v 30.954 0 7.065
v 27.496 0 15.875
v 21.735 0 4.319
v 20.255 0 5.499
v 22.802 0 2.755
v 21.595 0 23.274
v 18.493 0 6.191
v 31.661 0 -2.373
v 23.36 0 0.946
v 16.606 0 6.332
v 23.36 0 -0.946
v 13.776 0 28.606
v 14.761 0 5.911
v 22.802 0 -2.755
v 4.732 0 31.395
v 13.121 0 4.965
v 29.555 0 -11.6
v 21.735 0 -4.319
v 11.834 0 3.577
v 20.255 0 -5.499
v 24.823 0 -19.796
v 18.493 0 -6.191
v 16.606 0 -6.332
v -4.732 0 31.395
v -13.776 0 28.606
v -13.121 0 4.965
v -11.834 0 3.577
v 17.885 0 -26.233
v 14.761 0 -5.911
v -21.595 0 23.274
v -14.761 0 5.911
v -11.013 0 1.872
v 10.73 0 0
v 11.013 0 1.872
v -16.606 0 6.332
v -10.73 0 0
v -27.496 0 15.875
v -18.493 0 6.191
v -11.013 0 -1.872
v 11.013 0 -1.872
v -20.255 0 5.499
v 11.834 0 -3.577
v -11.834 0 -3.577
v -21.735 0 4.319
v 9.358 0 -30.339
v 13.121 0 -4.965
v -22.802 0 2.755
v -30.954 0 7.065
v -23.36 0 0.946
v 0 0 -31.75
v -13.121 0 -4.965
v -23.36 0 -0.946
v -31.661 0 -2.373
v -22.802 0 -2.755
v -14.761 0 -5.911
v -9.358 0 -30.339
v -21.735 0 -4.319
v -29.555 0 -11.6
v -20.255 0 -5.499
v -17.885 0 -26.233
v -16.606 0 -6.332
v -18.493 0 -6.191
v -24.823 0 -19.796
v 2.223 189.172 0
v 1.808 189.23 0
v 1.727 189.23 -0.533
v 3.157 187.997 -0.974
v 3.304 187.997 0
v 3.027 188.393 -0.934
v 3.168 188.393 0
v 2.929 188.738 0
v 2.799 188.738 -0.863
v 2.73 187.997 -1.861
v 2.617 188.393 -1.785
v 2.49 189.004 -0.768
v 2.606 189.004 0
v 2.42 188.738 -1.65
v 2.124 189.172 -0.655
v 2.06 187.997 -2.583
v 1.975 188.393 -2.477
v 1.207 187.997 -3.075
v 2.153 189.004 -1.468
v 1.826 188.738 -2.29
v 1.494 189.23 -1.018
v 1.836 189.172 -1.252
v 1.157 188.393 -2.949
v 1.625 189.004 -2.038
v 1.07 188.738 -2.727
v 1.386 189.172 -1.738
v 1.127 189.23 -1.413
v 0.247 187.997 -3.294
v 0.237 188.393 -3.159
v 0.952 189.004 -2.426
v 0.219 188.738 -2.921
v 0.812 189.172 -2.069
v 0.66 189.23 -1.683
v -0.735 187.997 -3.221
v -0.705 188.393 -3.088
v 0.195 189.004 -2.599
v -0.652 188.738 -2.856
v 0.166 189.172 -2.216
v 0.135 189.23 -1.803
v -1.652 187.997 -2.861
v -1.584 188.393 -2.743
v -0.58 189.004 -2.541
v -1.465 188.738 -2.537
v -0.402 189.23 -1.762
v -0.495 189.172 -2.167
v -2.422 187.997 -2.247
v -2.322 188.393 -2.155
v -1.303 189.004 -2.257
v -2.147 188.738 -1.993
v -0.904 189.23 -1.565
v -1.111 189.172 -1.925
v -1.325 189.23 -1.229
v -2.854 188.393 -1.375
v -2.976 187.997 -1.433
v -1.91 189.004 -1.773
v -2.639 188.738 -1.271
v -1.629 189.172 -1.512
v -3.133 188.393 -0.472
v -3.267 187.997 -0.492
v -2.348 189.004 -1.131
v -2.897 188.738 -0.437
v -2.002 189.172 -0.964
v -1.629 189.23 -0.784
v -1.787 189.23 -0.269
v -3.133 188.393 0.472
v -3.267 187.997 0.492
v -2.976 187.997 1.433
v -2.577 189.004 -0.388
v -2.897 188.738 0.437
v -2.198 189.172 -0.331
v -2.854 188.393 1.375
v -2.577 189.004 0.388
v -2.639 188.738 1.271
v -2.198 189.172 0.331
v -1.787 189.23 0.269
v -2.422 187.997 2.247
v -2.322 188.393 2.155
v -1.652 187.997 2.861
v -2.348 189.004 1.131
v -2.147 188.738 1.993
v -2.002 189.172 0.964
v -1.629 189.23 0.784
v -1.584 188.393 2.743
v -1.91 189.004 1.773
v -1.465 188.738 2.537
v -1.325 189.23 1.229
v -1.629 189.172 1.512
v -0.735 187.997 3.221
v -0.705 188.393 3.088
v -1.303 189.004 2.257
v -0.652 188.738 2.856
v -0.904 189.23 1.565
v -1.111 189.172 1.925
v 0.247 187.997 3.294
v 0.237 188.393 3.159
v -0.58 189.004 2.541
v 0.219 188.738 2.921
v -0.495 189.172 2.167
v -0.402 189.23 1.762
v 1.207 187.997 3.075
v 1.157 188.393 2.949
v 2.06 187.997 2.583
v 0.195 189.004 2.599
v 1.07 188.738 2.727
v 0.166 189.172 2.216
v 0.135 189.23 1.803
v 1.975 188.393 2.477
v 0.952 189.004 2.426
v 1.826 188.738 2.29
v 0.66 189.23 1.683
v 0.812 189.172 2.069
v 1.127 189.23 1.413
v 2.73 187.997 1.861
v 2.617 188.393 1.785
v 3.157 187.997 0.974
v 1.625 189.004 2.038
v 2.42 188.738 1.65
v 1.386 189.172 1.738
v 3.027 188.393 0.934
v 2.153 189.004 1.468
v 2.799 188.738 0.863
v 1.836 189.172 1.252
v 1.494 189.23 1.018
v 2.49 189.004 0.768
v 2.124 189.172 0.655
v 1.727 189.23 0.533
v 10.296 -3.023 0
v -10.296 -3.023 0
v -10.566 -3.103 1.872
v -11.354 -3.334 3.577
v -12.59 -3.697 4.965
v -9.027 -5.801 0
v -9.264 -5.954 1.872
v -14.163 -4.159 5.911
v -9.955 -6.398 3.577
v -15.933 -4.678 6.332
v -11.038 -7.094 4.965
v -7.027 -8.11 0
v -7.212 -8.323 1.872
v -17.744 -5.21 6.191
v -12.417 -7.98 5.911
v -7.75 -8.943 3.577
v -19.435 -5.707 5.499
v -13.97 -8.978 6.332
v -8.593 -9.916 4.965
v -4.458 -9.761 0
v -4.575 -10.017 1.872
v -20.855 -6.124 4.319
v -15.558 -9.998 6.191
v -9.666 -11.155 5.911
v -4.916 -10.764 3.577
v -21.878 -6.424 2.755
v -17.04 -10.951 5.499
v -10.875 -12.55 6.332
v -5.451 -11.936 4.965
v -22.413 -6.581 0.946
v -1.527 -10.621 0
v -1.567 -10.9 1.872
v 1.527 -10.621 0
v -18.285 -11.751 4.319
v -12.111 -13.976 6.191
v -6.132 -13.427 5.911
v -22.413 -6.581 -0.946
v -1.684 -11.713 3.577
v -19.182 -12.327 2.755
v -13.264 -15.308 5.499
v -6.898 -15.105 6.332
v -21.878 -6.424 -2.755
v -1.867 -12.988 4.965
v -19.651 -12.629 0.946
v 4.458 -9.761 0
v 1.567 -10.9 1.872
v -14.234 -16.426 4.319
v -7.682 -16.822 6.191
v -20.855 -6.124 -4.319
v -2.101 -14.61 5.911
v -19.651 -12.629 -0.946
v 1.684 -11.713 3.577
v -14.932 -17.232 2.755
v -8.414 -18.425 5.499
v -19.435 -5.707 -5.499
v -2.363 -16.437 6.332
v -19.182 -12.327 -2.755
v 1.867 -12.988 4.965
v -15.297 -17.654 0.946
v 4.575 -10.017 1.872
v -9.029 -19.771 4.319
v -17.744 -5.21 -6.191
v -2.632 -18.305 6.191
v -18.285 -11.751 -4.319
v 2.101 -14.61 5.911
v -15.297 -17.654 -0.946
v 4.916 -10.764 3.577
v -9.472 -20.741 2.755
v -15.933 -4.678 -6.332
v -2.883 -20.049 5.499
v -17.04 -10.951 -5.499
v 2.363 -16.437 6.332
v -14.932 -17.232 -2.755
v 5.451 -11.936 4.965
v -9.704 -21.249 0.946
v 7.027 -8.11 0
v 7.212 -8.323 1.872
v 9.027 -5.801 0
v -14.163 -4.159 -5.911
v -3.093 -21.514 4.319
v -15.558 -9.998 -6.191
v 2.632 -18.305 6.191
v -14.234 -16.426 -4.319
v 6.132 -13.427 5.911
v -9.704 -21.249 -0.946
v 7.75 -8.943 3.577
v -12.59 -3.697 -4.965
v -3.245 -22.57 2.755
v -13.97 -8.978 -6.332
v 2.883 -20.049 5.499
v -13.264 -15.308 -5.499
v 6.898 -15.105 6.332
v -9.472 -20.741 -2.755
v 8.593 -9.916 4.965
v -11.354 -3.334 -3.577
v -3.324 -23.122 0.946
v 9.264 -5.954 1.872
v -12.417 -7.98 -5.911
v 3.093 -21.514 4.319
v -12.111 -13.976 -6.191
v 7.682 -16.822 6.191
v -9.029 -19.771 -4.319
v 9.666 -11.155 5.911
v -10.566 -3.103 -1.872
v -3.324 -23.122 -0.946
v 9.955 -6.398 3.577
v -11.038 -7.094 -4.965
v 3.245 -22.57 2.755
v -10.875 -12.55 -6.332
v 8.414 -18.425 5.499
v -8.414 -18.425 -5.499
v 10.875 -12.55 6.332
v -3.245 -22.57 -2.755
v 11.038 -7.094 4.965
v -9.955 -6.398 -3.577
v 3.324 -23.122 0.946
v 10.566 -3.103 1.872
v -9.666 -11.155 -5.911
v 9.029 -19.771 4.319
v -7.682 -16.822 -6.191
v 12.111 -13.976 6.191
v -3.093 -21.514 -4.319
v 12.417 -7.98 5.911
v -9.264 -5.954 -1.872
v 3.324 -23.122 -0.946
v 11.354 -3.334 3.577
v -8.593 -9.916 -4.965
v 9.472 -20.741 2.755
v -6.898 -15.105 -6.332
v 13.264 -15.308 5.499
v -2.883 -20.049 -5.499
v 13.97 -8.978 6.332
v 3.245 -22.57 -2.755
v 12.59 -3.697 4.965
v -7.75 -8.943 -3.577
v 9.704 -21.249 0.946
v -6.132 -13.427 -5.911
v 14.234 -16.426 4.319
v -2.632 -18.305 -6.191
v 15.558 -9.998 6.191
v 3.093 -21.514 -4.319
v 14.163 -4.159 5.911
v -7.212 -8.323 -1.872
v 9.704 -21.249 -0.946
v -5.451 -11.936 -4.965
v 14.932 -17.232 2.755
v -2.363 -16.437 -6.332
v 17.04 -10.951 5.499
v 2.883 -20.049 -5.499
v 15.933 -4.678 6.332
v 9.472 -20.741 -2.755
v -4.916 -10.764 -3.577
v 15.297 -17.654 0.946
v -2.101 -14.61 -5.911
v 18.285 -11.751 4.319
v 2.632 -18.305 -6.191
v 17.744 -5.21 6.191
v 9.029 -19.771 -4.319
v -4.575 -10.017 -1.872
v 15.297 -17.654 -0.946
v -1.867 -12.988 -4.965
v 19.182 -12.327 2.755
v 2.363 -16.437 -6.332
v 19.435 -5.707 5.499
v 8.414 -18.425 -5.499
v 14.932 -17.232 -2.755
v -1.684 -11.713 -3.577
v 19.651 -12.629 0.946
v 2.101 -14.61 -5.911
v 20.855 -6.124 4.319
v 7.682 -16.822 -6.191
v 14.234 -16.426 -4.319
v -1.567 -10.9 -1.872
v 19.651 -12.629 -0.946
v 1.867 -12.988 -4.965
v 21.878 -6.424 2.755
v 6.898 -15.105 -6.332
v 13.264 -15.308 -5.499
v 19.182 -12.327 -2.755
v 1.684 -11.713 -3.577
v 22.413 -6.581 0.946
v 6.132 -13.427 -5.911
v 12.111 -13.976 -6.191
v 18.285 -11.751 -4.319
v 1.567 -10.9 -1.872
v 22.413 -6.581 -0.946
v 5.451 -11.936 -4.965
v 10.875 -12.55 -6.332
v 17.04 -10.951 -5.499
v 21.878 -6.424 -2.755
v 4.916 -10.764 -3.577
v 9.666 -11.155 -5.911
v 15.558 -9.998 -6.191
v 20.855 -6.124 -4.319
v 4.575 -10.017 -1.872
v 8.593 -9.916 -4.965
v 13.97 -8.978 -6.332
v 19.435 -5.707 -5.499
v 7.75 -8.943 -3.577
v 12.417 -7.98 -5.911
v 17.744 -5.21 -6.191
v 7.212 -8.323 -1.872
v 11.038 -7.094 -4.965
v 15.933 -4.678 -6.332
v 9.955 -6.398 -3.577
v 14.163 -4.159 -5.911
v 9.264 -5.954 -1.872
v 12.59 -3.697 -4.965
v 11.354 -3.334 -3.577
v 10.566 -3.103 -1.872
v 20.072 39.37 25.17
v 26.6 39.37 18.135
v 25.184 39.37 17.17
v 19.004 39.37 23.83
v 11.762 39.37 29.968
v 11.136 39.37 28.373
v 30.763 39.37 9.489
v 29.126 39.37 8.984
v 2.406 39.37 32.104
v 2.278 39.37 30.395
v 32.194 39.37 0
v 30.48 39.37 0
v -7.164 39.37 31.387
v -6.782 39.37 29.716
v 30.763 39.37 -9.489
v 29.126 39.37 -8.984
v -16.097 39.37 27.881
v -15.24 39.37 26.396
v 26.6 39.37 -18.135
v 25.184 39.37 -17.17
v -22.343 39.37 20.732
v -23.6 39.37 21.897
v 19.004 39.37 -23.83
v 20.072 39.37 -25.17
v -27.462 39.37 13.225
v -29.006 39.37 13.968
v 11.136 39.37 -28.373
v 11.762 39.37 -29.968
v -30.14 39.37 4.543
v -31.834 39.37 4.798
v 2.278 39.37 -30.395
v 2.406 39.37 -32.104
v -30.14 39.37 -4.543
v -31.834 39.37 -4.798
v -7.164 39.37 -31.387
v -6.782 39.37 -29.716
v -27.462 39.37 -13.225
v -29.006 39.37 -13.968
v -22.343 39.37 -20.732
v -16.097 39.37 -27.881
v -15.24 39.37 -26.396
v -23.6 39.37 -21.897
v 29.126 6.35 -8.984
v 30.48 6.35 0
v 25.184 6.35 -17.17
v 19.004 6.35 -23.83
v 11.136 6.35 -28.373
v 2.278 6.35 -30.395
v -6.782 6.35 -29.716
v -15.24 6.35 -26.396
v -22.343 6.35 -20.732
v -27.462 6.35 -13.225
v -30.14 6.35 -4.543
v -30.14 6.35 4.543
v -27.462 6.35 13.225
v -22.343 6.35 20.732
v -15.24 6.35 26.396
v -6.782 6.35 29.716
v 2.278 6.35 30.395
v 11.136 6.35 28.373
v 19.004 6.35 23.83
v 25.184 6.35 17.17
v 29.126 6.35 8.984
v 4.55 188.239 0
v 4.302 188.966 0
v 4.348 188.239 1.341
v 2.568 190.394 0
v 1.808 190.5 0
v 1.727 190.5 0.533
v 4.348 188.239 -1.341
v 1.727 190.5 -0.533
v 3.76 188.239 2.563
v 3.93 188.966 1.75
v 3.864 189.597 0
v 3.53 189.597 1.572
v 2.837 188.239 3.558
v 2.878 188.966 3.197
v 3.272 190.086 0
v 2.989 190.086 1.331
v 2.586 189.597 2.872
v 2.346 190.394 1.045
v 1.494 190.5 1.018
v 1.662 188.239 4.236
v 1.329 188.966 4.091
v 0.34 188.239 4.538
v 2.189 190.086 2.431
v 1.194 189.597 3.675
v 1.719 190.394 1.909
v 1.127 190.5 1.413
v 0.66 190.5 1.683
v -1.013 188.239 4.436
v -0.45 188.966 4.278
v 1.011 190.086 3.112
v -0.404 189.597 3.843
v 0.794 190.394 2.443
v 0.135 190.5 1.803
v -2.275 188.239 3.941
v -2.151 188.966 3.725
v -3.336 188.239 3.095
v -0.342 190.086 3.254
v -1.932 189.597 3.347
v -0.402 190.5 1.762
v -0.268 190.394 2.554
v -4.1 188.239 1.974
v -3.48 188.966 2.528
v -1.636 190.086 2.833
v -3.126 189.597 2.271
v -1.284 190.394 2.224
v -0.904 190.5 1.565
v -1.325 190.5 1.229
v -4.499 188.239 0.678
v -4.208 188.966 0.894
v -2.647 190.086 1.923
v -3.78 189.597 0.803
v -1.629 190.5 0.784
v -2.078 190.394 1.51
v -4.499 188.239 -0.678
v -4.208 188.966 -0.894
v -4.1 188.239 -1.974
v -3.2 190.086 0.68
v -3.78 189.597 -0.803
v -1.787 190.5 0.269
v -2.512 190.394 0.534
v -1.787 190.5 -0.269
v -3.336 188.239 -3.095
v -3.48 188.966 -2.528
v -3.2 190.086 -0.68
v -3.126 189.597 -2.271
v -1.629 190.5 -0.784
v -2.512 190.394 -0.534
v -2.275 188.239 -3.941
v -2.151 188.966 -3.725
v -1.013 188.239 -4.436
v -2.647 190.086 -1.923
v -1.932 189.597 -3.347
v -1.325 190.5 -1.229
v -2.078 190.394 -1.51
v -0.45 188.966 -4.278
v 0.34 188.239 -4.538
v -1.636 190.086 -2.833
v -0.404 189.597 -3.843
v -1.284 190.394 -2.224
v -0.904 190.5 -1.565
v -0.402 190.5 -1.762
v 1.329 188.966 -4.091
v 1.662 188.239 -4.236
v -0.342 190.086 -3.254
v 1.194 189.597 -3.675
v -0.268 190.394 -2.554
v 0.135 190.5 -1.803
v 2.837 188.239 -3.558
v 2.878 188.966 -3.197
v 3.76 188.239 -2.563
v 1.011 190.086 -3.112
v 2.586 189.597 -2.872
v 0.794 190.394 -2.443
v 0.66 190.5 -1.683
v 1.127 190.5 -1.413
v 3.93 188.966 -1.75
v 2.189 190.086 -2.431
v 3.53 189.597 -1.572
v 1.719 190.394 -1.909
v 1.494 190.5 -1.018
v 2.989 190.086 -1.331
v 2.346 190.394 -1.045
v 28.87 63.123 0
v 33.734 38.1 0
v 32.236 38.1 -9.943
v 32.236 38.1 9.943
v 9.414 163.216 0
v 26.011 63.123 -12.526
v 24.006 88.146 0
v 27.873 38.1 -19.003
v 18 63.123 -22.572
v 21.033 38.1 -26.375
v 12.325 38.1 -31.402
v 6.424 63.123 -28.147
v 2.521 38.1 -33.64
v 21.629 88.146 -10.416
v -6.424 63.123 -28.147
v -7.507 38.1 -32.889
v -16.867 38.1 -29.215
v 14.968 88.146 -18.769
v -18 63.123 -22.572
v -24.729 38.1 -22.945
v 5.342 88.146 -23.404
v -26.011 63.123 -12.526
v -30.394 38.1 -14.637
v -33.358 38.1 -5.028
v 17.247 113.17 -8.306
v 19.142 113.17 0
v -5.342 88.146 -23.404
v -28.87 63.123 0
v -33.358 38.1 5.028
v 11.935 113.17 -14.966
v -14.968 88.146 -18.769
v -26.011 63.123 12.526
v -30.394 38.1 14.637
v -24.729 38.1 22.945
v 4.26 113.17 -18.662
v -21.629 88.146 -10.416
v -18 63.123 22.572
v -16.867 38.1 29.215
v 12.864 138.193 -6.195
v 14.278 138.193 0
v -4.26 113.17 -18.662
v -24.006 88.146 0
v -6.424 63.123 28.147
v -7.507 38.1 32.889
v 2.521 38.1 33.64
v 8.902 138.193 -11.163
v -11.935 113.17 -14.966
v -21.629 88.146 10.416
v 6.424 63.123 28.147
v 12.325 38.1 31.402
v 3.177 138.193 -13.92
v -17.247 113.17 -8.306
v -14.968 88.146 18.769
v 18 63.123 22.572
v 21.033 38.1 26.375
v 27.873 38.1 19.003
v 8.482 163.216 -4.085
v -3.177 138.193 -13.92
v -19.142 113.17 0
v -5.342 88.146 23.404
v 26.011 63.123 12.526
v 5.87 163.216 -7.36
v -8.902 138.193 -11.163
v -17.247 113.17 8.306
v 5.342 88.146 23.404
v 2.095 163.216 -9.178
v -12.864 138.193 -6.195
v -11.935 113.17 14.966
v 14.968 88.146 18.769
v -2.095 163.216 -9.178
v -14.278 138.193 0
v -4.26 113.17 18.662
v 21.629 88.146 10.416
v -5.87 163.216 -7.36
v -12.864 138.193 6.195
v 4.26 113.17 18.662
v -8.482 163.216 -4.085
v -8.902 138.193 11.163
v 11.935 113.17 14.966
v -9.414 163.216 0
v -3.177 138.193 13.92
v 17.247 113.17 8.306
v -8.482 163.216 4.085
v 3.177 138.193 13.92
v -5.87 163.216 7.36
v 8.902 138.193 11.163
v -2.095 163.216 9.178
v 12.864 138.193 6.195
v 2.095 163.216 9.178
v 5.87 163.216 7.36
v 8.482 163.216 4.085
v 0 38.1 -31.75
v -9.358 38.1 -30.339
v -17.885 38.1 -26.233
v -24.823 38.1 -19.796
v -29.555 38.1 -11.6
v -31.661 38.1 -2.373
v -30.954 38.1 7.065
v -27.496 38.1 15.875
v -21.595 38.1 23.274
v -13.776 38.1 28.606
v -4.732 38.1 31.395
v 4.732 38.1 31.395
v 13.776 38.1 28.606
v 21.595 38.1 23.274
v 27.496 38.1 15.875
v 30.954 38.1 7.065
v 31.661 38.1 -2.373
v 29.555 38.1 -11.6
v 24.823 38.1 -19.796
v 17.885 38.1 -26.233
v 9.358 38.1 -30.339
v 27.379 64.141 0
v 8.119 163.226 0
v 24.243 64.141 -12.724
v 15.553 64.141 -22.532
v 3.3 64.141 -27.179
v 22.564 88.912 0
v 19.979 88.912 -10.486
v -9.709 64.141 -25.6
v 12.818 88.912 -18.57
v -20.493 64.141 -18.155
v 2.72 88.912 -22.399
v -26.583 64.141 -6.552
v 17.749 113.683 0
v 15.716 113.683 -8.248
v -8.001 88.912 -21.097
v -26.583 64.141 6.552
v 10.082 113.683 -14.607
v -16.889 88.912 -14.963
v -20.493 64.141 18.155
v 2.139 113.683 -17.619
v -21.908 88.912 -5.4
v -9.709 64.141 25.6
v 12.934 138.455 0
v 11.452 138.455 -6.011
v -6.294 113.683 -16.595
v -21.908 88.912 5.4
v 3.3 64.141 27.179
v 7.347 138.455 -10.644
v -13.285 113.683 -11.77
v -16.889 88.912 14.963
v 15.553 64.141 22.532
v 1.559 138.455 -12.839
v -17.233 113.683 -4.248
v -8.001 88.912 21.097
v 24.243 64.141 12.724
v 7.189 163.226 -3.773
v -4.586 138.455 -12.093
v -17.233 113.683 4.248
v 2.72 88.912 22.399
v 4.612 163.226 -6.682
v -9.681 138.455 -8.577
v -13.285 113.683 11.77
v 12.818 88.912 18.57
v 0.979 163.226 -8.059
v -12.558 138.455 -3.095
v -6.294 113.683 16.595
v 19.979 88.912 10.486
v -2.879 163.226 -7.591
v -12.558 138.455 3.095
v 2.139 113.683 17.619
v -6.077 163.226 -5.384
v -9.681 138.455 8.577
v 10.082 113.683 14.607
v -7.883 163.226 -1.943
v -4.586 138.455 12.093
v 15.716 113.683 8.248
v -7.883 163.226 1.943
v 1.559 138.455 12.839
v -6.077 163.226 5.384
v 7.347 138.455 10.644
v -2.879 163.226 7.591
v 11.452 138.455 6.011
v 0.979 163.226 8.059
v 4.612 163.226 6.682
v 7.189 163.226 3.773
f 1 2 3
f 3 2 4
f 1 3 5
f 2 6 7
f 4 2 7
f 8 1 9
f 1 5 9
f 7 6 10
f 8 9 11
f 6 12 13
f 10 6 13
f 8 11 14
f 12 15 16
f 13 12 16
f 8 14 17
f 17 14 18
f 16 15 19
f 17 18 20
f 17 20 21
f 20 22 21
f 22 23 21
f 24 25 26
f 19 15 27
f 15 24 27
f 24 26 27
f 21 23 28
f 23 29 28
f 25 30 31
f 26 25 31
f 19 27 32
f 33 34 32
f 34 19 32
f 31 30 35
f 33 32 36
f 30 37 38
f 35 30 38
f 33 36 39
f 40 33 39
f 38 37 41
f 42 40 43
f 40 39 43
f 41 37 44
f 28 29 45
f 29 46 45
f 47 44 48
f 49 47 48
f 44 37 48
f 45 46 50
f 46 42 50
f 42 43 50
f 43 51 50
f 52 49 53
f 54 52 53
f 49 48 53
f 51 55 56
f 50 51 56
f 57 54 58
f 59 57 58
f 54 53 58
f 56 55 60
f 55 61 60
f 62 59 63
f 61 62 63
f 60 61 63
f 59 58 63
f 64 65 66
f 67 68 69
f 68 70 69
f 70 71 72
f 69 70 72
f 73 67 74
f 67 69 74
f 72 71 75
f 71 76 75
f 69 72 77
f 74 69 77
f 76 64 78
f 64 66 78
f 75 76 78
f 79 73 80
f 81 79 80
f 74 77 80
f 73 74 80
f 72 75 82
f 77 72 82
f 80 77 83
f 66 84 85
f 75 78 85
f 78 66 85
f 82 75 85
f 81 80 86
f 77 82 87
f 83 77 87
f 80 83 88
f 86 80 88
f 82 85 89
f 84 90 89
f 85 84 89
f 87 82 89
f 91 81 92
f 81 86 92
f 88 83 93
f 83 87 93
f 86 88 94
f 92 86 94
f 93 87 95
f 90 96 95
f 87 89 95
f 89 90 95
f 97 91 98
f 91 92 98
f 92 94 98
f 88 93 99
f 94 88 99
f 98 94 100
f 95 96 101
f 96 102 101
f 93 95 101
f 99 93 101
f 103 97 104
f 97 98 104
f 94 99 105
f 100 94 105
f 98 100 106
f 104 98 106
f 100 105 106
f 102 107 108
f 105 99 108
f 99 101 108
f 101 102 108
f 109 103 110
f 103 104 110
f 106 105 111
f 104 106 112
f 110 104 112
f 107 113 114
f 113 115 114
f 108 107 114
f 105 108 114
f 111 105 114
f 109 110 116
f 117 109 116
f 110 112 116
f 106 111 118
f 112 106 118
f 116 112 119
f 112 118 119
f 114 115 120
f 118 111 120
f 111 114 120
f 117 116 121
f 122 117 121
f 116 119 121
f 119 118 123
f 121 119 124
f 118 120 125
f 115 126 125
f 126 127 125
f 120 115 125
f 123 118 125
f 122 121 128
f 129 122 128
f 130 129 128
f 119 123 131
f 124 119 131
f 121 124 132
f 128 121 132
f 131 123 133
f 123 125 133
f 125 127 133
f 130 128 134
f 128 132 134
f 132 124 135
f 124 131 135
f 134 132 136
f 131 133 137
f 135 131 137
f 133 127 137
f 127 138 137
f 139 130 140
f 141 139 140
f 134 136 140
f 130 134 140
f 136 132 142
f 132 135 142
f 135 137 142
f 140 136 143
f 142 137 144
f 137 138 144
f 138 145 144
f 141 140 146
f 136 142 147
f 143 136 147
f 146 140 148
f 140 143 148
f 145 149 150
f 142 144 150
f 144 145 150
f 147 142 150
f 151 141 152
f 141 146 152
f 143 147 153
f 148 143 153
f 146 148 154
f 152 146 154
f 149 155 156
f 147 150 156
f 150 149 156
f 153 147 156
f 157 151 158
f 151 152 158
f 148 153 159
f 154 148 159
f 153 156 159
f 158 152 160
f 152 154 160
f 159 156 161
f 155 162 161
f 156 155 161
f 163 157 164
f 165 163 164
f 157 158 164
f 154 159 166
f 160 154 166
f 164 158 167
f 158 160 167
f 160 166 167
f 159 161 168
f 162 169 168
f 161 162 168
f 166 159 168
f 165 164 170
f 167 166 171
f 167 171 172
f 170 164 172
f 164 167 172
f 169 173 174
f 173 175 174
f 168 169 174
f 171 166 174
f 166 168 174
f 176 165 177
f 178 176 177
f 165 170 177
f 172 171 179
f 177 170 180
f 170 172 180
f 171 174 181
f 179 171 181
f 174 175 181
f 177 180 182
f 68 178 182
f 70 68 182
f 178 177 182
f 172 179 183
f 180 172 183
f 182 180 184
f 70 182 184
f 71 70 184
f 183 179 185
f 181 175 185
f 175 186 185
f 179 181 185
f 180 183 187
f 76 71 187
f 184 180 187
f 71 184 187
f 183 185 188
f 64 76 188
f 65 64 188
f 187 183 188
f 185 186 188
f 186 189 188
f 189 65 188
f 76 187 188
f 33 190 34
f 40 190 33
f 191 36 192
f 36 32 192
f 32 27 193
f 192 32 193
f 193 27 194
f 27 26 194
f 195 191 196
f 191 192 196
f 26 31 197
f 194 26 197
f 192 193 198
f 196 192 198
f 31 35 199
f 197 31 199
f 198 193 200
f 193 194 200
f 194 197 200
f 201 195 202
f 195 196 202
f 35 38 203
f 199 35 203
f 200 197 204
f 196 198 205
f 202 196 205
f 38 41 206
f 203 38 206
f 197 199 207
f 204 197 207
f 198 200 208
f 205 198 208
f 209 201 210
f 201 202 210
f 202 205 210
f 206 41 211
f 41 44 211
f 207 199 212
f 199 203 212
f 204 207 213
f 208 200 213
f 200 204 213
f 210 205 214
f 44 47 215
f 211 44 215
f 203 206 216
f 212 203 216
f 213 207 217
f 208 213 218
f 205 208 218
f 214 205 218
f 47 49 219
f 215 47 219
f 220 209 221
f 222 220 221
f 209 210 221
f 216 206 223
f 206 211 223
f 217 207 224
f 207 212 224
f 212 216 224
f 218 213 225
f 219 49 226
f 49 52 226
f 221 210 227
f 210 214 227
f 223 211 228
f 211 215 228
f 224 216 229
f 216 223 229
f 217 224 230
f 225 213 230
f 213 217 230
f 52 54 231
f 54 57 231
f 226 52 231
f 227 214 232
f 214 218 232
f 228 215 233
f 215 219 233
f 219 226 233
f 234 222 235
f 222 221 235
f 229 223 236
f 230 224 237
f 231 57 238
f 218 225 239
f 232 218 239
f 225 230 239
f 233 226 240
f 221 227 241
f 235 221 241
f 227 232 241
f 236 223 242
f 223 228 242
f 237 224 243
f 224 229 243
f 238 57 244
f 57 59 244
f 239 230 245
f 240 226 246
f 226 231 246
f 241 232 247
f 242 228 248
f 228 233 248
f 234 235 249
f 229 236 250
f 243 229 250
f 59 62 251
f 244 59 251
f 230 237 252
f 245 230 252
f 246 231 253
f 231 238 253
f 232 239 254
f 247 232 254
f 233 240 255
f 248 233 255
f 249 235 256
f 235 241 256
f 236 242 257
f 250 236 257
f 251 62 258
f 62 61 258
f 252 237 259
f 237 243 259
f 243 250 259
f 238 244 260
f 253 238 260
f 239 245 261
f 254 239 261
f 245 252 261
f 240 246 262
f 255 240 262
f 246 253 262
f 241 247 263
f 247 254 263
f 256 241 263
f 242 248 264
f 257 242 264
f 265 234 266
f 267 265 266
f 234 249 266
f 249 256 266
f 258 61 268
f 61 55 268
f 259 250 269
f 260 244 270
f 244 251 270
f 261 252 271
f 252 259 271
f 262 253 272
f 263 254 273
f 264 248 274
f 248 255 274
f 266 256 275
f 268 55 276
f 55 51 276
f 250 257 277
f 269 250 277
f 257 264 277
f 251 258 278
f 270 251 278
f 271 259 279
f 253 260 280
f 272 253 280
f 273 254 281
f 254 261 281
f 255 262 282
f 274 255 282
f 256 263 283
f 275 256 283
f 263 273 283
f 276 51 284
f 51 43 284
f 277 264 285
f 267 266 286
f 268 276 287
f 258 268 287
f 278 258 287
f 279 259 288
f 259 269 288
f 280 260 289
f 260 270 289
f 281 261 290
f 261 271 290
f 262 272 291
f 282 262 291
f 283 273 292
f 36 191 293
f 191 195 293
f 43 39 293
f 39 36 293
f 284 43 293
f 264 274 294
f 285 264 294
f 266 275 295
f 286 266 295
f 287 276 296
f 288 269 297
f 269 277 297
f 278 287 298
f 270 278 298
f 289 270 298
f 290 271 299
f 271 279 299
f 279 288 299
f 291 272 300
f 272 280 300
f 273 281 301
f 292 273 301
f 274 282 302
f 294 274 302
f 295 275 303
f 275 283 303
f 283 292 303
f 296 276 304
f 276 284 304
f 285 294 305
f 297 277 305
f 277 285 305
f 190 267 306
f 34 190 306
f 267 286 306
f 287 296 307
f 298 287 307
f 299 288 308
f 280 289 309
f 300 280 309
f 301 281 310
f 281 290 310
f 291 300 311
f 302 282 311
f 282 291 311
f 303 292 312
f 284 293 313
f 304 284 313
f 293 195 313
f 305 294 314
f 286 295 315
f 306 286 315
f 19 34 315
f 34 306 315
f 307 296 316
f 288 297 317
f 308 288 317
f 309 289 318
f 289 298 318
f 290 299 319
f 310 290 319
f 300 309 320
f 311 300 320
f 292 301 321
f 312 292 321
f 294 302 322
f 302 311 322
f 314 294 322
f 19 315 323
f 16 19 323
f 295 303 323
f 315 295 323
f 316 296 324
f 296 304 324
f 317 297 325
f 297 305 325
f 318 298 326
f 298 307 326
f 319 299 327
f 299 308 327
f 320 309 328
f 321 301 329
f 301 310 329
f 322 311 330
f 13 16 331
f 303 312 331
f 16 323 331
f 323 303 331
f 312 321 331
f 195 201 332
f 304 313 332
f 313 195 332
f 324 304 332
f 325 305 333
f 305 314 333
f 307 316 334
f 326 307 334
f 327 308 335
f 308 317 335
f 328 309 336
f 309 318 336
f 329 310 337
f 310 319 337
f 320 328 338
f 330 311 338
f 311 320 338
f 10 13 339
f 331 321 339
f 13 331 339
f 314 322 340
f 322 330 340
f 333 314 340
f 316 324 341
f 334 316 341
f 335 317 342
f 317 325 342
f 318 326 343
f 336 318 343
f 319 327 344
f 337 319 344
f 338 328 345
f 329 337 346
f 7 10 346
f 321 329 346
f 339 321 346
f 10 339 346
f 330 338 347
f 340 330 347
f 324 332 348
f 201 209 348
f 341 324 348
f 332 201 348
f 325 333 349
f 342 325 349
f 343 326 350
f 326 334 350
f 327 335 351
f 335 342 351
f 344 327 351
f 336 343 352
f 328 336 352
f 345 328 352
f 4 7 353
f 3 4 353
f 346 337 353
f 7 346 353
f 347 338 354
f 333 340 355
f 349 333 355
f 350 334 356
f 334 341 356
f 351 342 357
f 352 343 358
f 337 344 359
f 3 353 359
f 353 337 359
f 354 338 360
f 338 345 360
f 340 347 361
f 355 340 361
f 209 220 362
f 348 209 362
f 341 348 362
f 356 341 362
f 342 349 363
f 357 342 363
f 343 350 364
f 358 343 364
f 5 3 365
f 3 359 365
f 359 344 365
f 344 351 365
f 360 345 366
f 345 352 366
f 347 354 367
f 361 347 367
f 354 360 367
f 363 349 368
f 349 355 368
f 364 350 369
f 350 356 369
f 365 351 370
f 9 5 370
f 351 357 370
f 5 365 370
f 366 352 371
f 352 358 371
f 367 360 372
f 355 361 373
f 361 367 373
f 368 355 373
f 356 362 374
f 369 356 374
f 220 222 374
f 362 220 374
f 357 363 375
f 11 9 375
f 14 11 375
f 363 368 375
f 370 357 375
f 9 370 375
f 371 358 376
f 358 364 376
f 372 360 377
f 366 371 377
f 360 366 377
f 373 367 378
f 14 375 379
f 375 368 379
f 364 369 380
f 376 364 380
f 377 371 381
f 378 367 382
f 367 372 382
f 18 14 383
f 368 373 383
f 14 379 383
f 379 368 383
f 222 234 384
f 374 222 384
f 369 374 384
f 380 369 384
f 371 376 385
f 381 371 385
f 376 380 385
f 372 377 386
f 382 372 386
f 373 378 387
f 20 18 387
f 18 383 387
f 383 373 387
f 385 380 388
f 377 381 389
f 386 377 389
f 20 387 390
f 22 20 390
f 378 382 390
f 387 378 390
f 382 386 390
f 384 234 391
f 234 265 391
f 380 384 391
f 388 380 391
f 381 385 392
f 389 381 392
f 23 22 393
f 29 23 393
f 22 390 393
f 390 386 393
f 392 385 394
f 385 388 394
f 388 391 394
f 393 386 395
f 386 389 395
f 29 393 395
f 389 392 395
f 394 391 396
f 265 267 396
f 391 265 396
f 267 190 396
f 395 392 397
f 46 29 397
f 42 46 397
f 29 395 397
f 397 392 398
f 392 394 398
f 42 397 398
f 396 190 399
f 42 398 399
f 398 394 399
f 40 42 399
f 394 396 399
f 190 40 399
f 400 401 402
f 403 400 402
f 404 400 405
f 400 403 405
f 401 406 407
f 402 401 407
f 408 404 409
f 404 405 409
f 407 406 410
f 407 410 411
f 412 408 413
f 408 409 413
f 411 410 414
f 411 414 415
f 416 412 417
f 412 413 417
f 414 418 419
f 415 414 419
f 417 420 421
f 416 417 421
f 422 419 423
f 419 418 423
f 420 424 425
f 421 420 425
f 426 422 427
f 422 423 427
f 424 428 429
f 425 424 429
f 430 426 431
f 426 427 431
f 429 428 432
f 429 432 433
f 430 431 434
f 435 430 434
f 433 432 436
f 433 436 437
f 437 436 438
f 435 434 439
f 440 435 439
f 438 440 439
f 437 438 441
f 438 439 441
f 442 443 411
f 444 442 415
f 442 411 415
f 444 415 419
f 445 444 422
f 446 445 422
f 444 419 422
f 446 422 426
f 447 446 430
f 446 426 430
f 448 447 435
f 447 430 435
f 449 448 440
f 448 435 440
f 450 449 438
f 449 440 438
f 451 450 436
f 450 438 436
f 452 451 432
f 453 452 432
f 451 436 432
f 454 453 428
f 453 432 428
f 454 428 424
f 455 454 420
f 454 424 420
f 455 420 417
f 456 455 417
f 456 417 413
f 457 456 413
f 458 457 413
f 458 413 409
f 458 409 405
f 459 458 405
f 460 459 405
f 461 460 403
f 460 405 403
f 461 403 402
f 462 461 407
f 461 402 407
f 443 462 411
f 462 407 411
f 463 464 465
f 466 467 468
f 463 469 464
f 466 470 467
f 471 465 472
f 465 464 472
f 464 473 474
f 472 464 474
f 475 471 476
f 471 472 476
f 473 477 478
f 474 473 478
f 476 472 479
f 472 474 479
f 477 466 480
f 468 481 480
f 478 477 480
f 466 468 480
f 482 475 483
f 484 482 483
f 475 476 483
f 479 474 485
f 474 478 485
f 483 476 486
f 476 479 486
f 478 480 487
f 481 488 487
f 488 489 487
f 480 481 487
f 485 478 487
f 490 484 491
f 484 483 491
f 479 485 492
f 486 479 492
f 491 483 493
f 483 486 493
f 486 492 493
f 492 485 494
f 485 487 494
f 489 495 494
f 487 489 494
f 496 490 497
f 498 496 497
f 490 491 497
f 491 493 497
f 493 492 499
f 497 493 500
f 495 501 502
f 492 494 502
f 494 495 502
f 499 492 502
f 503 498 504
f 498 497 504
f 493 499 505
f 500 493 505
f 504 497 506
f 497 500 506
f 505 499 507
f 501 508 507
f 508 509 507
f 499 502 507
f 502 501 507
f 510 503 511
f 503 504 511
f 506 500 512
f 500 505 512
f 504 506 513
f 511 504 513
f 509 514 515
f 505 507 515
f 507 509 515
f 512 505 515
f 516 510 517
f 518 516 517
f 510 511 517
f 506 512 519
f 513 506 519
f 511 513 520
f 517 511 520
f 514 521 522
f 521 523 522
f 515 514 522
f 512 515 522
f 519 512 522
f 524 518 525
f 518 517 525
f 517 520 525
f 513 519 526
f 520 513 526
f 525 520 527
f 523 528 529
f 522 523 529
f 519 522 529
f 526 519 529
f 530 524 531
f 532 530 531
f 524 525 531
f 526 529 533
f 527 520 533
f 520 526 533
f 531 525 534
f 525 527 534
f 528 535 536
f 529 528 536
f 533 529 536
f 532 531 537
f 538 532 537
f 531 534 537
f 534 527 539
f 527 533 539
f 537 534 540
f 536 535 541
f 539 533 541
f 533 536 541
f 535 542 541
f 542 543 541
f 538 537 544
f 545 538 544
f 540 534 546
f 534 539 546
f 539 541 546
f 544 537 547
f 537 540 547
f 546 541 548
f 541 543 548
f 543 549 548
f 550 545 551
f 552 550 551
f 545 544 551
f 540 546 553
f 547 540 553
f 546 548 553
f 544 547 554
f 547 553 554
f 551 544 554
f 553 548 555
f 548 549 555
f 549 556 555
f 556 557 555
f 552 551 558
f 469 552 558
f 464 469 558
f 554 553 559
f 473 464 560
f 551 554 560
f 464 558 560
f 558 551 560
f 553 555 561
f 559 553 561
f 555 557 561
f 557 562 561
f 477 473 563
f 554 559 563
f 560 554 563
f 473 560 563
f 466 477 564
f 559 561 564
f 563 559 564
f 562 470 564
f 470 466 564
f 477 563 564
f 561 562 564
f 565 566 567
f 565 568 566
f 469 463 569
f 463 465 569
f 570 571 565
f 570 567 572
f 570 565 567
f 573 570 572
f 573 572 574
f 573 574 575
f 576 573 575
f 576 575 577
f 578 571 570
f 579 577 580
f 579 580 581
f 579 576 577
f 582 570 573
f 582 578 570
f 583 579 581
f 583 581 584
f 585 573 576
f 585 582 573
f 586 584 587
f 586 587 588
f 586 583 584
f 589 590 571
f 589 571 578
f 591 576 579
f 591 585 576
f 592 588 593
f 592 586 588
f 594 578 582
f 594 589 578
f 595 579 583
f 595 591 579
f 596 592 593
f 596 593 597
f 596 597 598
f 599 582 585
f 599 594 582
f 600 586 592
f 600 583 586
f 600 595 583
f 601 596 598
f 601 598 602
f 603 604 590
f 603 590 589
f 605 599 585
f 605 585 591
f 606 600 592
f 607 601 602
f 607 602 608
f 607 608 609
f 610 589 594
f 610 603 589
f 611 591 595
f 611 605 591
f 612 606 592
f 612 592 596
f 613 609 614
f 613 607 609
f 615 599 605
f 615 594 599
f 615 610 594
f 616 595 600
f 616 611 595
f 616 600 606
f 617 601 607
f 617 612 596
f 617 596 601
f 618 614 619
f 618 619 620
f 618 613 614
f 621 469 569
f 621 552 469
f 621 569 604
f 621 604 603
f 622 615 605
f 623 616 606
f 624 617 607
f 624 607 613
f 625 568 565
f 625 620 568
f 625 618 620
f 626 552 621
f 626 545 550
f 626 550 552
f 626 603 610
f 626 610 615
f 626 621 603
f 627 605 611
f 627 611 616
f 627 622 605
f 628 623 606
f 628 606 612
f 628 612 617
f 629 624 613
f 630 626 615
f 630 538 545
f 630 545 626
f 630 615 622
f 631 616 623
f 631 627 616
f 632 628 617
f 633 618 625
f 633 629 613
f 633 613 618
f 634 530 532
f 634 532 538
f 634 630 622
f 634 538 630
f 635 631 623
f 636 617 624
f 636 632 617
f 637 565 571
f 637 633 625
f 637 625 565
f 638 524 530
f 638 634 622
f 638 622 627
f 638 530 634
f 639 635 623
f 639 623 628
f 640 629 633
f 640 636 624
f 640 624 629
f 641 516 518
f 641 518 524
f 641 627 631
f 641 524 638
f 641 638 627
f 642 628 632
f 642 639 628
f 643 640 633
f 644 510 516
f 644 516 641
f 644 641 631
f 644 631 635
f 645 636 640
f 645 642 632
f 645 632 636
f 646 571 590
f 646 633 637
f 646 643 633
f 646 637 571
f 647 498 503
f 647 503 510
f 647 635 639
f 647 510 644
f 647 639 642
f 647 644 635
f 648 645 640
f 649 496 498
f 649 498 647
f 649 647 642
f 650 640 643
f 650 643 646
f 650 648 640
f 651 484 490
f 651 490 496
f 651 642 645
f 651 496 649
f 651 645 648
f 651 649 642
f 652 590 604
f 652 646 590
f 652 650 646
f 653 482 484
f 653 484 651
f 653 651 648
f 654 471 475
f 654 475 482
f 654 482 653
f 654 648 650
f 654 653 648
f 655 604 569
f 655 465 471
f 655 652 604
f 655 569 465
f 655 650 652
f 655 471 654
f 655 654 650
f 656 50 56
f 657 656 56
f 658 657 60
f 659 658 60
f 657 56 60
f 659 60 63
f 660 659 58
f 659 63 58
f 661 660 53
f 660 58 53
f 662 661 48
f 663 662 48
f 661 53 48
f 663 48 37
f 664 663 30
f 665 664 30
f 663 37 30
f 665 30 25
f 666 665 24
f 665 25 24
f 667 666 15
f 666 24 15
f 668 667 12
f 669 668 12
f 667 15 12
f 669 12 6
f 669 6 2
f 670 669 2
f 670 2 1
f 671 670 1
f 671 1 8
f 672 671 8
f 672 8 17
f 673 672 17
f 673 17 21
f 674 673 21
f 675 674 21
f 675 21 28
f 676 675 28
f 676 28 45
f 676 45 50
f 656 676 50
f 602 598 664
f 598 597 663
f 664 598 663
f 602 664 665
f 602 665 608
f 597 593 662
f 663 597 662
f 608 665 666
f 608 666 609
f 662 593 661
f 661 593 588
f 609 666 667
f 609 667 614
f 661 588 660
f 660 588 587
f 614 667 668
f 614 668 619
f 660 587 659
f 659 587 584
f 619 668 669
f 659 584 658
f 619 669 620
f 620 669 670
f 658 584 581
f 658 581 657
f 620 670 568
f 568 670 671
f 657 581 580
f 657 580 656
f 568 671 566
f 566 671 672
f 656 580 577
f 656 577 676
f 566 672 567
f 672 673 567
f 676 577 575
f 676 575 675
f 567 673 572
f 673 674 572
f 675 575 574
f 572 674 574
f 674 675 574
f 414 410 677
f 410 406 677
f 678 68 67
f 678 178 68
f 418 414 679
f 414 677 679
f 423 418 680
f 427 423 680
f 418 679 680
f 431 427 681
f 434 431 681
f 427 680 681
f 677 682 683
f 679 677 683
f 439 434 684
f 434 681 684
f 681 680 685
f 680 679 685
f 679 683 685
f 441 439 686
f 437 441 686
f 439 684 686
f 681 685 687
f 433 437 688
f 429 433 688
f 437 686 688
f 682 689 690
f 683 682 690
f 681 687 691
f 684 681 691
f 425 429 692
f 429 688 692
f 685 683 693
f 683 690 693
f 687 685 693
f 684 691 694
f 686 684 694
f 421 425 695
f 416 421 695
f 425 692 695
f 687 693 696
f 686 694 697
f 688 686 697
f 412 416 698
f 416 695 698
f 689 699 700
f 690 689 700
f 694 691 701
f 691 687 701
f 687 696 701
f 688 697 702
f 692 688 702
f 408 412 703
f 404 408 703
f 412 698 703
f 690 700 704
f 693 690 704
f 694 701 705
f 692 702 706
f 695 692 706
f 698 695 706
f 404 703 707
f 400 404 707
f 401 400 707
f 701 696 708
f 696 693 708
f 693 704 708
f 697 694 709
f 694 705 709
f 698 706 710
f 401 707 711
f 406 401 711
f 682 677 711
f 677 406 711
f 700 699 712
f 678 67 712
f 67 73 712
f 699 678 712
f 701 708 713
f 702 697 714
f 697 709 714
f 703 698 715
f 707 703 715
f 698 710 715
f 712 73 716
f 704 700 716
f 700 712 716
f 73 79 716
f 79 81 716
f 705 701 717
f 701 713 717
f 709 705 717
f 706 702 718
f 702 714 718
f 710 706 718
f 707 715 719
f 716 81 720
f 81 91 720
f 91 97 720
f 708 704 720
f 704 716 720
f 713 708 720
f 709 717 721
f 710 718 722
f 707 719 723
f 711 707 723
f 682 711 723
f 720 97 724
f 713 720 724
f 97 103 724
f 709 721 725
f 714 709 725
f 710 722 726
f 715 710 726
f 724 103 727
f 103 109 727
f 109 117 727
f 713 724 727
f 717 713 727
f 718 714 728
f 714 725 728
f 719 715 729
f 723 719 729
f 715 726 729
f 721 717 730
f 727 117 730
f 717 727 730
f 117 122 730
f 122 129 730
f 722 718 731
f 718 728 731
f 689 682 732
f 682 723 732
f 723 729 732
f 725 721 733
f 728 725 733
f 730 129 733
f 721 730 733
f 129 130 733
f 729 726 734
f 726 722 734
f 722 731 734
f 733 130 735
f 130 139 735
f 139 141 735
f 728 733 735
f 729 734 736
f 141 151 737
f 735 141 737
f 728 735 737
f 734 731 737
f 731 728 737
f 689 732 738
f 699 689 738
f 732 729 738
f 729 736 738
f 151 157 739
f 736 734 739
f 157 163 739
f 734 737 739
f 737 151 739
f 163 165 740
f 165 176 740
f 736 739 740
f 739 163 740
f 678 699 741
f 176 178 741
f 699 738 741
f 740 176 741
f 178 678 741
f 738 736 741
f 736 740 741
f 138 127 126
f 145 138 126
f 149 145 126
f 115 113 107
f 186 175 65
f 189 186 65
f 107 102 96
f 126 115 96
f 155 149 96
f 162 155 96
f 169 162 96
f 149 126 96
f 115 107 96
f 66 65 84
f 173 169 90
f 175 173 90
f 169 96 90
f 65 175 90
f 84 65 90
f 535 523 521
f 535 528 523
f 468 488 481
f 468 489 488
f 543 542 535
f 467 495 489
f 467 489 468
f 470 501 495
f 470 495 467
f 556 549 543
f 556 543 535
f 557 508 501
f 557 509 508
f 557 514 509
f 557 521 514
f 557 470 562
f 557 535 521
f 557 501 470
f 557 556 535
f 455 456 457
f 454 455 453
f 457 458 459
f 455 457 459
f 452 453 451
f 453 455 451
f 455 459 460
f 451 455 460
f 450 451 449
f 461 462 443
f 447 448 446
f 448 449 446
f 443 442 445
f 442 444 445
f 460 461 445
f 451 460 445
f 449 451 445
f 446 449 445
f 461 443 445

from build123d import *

# Parameters (mm, degrees)
SKETCH1_R           = 31.75
BOSS_EXTRUDE1_DEPTH = 38.1
SKETCH2_R           = 33.734375
BOSS_EXTRUDE2_DEPTH = 152.4
BOSS_EXTRUDE2_TAPER = 11
FILLET1_R           = 2.794
SKETCH4_R           = 6.35
REVOLVE1_ANGLE      = 180
SKETCH5_R           = 31.75
BOSS_EXTRUDE3_DEPTH = 6.35


# Read off the part's stored shape, not the designer's step: Shell3
with BuildPart() as part:
    # Sketch1 → Boss-Extrude1 (new body)
    with BuildSketch(Plane(origin=(0, 0, 0), x_dir=(1, 0, 0), z_dir=(0, 1, 0))):
        with Locations(Location((0, 0, 0), (0, 0, 90))):
            Circle(SKETCH1_R)
    extrude(amount=BOSS_EXTRUDE1_DEPTH)

    # Sketch2 → Boss-Extrude2 (add)
    with BuildSketch(Plane(origin=(0, 38.1, 0), x_dir=(1, 0, 0), z_dir=(0, 1, 0))):
        Circle(SKETCH2_R)
    extrude(amount=BOSS_EXTRUDE2_DEPTH, taper=BOSS_EXTRUDE2_TAPER)

    # Fillet1
    fillet1_edges = [part.edges().sort_by_distance(p)[0] for p in [
        (-4.110815887, 190.5, 0),
    ]]
    fillet(fillet1_edges, radius=FILLET1_R)

    # Shell3 outline → Shell3 (revolve, cut)
    with BuildSketch(Plane.XY):
        with BuildLine():
            Line((32.193741805, 39.37), (3.303619853, 187.996792909))
            ThreePointArc((3.303619853, 187.996792909), (2.777003233, 188.881955865), (1.807620025, 189.23))
            Line((1.807620025, 189.23), (0, 189.23))
            Line((0, 189.23), (0, 1.27))
            Line((0, 1.27), (30.48, 1.27))
            Line((30.48, 1.27), (30.48, 39.37))
            Line((30.48, 39.37), (32.193741805, 39.37))
        make_face()
    revolve(axis=Axis((0, 0, 0), (0, 1, 0)), mode=Mode.SUBTRACT)

    # Sketch4 → Revolve1 (revolve)
    with BuildSketch(Plane.XZ):
        with Locations((-17.08043758, 0)):
            Circle(SKETCH4_R)
    revolve(axis=Axis((0, 0, 0), (0, 0, 1)), revolution_arc=REVOLVE1_ANGLE)

    # Sketch5 → Boss-Extrude3 (add)
    with BuildSketch(Plane.XZ):
        with Locations(Location((0, 0, 0), (0, 0, 270))):
            Circle(SKETCH5_R)
    extrude(amount=-BOSS_EXTRUDE3_DEPTH)


solid = part.part
